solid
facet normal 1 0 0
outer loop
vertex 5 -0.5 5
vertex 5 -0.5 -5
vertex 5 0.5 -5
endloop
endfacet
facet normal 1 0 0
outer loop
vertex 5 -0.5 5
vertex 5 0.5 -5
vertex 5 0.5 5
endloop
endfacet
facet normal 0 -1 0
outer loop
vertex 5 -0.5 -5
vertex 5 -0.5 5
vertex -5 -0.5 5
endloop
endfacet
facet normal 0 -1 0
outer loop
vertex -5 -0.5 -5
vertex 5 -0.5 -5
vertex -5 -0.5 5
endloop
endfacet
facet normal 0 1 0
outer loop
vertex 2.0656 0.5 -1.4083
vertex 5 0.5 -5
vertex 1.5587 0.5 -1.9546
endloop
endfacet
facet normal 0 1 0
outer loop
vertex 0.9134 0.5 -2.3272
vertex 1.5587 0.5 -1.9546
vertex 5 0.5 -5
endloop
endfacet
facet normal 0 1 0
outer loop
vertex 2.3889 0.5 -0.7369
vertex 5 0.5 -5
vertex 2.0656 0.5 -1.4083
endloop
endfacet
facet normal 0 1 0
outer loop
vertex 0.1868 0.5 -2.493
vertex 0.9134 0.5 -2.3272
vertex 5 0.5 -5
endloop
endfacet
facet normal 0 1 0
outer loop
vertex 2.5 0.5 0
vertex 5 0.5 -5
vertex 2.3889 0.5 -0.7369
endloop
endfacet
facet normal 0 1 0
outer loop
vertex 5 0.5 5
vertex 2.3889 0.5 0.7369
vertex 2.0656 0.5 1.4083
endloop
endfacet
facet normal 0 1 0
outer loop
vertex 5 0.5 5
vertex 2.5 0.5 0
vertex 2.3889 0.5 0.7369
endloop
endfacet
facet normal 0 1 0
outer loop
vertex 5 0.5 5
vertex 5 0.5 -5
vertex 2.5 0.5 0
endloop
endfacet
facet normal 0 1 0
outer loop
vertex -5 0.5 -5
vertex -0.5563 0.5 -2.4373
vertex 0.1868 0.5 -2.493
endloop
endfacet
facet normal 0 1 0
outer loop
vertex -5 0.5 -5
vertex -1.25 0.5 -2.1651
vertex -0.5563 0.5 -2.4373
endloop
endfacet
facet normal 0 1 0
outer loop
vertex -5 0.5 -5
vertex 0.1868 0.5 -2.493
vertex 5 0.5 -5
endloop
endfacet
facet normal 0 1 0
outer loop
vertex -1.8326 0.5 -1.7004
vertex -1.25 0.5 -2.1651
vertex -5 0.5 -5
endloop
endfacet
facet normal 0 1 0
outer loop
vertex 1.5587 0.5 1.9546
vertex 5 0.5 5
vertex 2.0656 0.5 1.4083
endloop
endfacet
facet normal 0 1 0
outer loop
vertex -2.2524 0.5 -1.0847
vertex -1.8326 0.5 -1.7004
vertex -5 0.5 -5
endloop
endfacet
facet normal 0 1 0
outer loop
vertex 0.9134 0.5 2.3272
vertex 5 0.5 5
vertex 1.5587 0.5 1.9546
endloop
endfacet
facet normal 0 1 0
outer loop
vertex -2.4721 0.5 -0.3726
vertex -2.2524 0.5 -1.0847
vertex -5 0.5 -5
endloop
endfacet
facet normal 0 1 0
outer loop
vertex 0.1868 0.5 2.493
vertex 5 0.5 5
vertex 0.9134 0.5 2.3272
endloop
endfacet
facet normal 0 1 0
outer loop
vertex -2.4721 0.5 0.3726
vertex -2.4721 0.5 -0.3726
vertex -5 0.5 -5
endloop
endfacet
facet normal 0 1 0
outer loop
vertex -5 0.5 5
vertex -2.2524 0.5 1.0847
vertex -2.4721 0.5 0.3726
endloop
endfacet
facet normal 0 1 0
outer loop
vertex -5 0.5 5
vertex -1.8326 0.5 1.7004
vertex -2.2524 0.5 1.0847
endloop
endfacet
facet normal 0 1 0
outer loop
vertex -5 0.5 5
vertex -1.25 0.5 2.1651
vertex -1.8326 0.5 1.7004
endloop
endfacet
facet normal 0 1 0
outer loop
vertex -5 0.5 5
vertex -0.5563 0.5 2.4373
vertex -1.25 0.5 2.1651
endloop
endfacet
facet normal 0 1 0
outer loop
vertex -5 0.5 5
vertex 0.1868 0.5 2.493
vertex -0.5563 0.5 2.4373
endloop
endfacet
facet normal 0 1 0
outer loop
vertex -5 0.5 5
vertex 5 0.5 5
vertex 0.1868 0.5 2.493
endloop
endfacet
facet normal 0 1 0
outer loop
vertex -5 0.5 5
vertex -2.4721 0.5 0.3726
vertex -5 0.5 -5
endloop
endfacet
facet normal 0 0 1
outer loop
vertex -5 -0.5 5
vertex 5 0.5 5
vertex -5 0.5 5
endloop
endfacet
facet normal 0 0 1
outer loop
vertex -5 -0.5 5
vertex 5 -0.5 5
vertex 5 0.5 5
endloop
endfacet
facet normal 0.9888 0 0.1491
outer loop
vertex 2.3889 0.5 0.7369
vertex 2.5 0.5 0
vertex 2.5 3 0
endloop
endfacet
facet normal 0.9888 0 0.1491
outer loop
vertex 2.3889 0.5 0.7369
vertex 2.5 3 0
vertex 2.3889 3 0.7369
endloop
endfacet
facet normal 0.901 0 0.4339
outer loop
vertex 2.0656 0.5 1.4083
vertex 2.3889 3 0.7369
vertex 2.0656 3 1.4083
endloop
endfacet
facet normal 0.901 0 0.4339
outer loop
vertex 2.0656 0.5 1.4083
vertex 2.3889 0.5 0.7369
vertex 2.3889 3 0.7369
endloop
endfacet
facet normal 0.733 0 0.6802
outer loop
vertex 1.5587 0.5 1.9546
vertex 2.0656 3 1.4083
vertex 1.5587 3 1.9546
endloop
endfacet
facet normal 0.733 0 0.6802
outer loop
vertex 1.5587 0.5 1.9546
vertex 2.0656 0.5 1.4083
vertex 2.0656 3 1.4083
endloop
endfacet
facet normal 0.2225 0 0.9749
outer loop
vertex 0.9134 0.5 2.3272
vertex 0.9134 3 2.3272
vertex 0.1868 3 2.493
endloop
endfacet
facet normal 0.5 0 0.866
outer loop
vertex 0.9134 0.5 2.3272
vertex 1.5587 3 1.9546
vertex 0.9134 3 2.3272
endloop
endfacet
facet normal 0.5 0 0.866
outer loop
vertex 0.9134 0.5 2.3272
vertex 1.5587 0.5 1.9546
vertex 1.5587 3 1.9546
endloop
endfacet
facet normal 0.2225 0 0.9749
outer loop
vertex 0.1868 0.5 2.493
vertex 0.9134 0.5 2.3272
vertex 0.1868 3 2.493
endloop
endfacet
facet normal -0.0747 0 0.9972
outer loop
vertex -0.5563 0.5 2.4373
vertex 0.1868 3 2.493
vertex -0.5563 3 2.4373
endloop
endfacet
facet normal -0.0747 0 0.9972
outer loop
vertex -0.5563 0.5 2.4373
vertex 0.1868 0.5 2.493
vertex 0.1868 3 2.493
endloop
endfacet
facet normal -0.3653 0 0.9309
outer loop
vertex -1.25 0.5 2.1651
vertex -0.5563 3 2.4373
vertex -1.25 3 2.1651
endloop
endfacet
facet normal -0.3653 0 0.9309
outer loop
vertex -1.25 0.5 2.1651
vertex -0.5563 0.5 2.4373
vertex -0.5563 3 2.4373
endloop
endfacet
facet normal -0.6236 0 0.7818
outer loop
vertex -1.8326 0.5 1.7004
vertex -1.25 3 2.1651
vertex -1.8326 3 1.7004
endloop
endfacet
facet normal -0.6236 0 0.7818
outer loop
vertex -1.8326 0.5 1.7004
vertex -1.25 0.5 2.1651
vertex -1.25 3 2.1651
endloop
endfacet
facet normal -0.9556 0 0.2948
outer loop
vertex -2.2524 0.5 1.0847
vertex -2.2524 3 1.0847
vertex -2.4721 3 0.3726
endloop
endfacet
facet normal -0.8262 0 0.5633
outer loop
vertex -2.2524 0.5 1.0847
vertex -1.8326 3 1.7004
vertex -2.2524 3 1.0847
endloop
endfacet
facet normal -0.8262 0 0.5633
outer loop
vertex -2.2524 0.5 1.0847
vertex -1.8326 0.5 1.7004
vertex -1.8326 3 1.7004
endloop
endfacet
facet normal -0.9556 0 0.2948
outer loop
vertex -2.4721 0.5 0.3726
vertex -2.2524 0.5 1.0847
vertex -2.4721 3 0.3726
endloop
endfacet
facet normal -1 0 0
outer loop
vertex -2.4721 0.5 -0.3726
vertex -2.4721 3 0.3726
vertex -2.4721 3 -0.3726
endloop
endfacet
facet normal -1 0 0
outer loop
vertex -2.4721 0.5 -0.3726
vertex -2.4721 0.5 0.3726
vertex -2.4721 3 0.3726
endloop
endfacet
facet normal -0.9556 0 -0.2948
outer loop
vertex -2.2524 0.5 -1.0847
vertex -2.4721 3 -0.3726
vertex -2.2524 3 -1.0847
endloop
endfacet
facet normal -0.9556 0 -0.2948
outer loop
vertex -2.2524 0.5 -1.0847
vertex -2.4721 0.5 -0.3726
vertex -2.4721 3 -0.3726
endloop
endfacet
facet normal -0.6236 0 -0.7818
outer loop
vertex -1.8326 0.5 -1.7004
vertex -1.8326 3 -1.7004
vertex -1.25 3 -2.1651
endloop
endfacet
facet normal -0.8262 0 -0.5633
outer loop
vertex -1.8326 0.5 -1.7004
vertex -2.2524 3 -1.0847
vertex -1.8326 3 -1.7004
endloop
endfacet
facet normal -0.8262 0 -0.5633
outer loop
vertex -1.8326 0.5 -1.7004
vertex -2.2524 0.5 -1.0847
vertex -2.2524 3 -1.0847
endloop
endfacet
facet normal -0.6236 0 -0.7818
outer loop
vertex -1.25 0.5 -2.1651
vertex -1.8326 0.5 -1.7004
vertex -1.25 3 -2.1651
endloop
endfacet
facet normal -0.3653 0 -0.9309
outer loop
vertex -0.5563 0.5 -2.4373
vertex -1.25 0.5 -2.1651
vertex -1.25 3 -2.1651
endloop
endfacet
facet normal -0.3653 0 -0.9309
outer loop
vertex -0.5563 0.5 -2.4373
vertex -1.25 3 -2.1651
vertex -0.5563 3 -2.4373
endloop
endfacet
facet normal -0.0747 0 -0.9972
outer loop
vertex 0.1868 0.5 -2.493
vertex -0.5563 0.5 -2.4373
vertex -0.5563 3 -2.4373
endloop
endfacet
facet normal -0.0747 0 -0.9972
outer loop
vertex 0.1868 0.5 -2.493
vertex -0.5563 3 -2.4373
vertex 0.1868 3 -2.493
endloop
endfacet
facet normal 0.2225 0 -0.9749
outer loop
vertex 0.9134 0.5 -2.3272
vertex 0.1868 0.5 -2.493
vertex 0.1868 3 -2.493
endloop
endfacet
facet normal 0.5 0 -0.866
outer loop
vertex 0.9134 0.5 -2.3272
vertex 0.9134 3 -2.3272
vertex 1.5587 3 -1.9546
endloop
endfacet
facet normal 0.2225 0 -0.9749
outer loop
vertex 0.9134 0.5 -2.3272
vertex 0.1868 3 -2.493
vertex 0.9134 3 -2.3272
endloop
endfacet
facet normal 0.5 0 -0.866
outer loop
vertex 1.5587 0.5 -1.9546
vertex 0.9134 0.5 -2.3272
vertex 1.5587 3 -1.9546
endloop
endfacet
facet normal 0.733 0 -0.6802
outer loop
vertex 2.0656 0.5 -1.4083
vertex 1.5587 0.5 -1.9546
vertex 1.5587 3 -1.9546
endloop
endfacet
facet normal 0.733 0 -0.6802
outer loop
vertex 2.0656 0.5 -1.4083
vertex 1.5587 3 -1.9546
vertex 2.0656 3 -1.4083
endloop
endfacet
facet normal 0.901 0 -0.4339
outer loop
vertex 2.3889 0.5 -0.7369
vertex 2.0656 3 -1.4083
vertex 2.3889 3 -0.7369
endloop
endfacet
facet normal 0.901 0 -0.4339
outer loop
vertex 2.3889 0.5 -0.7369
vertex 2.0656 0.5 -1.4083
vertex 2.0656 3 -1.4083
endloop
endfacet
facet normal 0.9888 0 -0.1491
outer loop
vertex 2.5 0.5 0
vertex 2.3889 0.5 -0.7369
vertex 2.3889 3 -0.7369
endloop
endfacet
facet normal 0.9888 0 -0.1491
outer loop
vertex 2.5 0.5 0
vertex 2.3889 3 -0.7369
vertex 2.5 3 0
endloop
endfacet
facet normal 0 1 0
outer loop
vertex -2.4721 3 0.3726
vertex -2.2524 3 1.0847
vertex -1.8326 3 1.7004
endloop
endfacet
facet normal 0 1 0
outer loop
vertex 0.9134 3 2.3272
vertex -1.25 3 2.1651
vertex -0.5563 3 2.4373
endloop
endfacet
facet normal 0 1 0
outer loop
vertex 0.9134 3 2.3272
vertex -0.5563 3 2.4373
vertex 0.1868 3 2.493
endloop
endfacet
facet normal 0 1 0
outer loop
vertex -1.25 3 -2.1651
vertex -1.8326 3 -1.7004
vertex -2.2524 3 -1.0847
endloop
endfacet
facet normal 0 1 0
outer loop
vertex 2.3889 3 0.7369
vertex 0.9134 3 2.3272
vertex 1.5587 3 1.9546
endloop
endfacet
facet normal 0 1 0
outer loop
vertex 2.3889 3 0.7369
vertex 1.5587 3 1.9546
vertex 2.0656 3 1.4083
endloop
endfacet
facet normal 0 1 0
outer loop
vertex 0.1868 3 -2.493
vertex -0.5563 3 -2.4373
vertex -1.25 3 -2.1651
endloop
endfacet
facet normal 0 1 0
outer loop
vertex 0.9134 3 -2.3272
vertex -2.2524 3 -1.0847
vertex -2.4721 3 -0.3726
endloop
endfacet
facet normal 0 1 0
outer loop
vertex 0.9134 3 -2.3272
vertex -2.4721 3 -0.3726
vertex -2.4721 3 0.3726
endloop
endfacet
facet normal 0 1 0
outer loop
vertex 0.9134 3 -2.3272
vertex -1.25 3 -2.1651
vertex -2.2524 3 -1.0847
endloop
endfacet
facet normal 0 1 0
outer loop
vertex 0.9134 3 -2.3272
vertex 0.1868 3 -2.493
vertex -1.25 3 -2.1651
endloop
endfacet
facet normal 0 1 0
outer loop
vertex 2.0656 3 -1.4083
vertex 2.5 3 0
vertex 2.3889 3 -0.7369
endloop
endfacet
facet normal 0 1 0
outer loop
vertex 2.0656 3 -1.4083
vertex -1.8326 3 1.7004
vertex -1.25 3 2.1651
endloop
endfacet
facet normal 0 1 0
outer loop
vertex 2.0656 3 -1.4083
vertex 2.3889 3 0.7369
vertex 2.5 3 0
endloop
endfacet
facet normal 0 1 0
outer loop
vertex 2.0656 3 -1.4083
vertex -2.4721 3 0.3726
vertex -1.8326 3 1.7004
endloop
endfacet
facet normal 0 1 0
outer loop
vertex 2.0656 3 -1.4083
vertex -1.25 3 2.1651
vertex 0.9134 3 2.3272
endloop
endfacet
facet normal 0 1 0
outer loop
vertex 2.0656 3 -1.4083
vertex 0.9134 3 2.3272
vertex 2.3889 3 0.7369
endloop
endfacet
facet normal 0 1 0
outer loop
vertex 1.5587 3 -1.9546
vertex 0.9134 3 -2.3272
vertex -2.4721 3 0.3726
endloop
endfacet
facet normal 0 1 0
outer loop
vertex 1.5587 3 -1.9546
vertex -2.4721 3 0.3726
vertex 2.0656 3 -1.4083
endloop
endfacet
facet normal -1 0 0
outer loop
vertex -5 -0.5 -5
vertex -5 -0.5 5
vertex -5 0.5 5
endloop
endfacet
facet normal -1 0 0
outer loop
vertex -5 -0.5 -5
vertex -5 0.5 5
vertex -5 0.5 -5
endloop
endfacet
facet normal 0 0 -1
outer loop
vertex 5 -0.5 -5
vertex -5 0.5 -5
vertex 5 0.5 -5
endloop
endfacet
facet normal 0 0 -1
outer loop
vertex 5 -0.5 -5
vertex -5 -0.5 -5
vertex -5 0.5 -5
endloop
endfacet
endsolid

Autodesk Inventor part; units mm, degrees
sketch "Sketch1" plane through (0, 0, 0) normal (0, 1, 0) x (-1, 0, 0)
  line L0 (5, -5) -> (-5, -5)
  line L1 (-5, -5) -> (-5, 5)
  line L2 (-5, 5) -> (5, 5)
  line L3 (5, 5) -> (5, -5)
  line L4 (0, -6.825) -> (0, 6.825) projected
  line L5 (-7, 0) -> (7, 0) projected
  point P0 (0, 0)
  point P1 (0, -5)
  point P2 (5, 0)
  dimension "d0" = 10
  dimension "d1" = 10
extrude "Extrusion1" add sketch "Sketch1" along normal mid plane 1
sketch "Sketch2" plane through (0, 0.5, 0) normal (0, 1, 0) x (1, 0, 0)
  circle A0 centre (0, 0) radius 2.5
  dimension "d4" = 5
extrude "Extrusion2" add sketch "Sketch2" along normal blind 2.5
properties part number "1x1_Piece"
